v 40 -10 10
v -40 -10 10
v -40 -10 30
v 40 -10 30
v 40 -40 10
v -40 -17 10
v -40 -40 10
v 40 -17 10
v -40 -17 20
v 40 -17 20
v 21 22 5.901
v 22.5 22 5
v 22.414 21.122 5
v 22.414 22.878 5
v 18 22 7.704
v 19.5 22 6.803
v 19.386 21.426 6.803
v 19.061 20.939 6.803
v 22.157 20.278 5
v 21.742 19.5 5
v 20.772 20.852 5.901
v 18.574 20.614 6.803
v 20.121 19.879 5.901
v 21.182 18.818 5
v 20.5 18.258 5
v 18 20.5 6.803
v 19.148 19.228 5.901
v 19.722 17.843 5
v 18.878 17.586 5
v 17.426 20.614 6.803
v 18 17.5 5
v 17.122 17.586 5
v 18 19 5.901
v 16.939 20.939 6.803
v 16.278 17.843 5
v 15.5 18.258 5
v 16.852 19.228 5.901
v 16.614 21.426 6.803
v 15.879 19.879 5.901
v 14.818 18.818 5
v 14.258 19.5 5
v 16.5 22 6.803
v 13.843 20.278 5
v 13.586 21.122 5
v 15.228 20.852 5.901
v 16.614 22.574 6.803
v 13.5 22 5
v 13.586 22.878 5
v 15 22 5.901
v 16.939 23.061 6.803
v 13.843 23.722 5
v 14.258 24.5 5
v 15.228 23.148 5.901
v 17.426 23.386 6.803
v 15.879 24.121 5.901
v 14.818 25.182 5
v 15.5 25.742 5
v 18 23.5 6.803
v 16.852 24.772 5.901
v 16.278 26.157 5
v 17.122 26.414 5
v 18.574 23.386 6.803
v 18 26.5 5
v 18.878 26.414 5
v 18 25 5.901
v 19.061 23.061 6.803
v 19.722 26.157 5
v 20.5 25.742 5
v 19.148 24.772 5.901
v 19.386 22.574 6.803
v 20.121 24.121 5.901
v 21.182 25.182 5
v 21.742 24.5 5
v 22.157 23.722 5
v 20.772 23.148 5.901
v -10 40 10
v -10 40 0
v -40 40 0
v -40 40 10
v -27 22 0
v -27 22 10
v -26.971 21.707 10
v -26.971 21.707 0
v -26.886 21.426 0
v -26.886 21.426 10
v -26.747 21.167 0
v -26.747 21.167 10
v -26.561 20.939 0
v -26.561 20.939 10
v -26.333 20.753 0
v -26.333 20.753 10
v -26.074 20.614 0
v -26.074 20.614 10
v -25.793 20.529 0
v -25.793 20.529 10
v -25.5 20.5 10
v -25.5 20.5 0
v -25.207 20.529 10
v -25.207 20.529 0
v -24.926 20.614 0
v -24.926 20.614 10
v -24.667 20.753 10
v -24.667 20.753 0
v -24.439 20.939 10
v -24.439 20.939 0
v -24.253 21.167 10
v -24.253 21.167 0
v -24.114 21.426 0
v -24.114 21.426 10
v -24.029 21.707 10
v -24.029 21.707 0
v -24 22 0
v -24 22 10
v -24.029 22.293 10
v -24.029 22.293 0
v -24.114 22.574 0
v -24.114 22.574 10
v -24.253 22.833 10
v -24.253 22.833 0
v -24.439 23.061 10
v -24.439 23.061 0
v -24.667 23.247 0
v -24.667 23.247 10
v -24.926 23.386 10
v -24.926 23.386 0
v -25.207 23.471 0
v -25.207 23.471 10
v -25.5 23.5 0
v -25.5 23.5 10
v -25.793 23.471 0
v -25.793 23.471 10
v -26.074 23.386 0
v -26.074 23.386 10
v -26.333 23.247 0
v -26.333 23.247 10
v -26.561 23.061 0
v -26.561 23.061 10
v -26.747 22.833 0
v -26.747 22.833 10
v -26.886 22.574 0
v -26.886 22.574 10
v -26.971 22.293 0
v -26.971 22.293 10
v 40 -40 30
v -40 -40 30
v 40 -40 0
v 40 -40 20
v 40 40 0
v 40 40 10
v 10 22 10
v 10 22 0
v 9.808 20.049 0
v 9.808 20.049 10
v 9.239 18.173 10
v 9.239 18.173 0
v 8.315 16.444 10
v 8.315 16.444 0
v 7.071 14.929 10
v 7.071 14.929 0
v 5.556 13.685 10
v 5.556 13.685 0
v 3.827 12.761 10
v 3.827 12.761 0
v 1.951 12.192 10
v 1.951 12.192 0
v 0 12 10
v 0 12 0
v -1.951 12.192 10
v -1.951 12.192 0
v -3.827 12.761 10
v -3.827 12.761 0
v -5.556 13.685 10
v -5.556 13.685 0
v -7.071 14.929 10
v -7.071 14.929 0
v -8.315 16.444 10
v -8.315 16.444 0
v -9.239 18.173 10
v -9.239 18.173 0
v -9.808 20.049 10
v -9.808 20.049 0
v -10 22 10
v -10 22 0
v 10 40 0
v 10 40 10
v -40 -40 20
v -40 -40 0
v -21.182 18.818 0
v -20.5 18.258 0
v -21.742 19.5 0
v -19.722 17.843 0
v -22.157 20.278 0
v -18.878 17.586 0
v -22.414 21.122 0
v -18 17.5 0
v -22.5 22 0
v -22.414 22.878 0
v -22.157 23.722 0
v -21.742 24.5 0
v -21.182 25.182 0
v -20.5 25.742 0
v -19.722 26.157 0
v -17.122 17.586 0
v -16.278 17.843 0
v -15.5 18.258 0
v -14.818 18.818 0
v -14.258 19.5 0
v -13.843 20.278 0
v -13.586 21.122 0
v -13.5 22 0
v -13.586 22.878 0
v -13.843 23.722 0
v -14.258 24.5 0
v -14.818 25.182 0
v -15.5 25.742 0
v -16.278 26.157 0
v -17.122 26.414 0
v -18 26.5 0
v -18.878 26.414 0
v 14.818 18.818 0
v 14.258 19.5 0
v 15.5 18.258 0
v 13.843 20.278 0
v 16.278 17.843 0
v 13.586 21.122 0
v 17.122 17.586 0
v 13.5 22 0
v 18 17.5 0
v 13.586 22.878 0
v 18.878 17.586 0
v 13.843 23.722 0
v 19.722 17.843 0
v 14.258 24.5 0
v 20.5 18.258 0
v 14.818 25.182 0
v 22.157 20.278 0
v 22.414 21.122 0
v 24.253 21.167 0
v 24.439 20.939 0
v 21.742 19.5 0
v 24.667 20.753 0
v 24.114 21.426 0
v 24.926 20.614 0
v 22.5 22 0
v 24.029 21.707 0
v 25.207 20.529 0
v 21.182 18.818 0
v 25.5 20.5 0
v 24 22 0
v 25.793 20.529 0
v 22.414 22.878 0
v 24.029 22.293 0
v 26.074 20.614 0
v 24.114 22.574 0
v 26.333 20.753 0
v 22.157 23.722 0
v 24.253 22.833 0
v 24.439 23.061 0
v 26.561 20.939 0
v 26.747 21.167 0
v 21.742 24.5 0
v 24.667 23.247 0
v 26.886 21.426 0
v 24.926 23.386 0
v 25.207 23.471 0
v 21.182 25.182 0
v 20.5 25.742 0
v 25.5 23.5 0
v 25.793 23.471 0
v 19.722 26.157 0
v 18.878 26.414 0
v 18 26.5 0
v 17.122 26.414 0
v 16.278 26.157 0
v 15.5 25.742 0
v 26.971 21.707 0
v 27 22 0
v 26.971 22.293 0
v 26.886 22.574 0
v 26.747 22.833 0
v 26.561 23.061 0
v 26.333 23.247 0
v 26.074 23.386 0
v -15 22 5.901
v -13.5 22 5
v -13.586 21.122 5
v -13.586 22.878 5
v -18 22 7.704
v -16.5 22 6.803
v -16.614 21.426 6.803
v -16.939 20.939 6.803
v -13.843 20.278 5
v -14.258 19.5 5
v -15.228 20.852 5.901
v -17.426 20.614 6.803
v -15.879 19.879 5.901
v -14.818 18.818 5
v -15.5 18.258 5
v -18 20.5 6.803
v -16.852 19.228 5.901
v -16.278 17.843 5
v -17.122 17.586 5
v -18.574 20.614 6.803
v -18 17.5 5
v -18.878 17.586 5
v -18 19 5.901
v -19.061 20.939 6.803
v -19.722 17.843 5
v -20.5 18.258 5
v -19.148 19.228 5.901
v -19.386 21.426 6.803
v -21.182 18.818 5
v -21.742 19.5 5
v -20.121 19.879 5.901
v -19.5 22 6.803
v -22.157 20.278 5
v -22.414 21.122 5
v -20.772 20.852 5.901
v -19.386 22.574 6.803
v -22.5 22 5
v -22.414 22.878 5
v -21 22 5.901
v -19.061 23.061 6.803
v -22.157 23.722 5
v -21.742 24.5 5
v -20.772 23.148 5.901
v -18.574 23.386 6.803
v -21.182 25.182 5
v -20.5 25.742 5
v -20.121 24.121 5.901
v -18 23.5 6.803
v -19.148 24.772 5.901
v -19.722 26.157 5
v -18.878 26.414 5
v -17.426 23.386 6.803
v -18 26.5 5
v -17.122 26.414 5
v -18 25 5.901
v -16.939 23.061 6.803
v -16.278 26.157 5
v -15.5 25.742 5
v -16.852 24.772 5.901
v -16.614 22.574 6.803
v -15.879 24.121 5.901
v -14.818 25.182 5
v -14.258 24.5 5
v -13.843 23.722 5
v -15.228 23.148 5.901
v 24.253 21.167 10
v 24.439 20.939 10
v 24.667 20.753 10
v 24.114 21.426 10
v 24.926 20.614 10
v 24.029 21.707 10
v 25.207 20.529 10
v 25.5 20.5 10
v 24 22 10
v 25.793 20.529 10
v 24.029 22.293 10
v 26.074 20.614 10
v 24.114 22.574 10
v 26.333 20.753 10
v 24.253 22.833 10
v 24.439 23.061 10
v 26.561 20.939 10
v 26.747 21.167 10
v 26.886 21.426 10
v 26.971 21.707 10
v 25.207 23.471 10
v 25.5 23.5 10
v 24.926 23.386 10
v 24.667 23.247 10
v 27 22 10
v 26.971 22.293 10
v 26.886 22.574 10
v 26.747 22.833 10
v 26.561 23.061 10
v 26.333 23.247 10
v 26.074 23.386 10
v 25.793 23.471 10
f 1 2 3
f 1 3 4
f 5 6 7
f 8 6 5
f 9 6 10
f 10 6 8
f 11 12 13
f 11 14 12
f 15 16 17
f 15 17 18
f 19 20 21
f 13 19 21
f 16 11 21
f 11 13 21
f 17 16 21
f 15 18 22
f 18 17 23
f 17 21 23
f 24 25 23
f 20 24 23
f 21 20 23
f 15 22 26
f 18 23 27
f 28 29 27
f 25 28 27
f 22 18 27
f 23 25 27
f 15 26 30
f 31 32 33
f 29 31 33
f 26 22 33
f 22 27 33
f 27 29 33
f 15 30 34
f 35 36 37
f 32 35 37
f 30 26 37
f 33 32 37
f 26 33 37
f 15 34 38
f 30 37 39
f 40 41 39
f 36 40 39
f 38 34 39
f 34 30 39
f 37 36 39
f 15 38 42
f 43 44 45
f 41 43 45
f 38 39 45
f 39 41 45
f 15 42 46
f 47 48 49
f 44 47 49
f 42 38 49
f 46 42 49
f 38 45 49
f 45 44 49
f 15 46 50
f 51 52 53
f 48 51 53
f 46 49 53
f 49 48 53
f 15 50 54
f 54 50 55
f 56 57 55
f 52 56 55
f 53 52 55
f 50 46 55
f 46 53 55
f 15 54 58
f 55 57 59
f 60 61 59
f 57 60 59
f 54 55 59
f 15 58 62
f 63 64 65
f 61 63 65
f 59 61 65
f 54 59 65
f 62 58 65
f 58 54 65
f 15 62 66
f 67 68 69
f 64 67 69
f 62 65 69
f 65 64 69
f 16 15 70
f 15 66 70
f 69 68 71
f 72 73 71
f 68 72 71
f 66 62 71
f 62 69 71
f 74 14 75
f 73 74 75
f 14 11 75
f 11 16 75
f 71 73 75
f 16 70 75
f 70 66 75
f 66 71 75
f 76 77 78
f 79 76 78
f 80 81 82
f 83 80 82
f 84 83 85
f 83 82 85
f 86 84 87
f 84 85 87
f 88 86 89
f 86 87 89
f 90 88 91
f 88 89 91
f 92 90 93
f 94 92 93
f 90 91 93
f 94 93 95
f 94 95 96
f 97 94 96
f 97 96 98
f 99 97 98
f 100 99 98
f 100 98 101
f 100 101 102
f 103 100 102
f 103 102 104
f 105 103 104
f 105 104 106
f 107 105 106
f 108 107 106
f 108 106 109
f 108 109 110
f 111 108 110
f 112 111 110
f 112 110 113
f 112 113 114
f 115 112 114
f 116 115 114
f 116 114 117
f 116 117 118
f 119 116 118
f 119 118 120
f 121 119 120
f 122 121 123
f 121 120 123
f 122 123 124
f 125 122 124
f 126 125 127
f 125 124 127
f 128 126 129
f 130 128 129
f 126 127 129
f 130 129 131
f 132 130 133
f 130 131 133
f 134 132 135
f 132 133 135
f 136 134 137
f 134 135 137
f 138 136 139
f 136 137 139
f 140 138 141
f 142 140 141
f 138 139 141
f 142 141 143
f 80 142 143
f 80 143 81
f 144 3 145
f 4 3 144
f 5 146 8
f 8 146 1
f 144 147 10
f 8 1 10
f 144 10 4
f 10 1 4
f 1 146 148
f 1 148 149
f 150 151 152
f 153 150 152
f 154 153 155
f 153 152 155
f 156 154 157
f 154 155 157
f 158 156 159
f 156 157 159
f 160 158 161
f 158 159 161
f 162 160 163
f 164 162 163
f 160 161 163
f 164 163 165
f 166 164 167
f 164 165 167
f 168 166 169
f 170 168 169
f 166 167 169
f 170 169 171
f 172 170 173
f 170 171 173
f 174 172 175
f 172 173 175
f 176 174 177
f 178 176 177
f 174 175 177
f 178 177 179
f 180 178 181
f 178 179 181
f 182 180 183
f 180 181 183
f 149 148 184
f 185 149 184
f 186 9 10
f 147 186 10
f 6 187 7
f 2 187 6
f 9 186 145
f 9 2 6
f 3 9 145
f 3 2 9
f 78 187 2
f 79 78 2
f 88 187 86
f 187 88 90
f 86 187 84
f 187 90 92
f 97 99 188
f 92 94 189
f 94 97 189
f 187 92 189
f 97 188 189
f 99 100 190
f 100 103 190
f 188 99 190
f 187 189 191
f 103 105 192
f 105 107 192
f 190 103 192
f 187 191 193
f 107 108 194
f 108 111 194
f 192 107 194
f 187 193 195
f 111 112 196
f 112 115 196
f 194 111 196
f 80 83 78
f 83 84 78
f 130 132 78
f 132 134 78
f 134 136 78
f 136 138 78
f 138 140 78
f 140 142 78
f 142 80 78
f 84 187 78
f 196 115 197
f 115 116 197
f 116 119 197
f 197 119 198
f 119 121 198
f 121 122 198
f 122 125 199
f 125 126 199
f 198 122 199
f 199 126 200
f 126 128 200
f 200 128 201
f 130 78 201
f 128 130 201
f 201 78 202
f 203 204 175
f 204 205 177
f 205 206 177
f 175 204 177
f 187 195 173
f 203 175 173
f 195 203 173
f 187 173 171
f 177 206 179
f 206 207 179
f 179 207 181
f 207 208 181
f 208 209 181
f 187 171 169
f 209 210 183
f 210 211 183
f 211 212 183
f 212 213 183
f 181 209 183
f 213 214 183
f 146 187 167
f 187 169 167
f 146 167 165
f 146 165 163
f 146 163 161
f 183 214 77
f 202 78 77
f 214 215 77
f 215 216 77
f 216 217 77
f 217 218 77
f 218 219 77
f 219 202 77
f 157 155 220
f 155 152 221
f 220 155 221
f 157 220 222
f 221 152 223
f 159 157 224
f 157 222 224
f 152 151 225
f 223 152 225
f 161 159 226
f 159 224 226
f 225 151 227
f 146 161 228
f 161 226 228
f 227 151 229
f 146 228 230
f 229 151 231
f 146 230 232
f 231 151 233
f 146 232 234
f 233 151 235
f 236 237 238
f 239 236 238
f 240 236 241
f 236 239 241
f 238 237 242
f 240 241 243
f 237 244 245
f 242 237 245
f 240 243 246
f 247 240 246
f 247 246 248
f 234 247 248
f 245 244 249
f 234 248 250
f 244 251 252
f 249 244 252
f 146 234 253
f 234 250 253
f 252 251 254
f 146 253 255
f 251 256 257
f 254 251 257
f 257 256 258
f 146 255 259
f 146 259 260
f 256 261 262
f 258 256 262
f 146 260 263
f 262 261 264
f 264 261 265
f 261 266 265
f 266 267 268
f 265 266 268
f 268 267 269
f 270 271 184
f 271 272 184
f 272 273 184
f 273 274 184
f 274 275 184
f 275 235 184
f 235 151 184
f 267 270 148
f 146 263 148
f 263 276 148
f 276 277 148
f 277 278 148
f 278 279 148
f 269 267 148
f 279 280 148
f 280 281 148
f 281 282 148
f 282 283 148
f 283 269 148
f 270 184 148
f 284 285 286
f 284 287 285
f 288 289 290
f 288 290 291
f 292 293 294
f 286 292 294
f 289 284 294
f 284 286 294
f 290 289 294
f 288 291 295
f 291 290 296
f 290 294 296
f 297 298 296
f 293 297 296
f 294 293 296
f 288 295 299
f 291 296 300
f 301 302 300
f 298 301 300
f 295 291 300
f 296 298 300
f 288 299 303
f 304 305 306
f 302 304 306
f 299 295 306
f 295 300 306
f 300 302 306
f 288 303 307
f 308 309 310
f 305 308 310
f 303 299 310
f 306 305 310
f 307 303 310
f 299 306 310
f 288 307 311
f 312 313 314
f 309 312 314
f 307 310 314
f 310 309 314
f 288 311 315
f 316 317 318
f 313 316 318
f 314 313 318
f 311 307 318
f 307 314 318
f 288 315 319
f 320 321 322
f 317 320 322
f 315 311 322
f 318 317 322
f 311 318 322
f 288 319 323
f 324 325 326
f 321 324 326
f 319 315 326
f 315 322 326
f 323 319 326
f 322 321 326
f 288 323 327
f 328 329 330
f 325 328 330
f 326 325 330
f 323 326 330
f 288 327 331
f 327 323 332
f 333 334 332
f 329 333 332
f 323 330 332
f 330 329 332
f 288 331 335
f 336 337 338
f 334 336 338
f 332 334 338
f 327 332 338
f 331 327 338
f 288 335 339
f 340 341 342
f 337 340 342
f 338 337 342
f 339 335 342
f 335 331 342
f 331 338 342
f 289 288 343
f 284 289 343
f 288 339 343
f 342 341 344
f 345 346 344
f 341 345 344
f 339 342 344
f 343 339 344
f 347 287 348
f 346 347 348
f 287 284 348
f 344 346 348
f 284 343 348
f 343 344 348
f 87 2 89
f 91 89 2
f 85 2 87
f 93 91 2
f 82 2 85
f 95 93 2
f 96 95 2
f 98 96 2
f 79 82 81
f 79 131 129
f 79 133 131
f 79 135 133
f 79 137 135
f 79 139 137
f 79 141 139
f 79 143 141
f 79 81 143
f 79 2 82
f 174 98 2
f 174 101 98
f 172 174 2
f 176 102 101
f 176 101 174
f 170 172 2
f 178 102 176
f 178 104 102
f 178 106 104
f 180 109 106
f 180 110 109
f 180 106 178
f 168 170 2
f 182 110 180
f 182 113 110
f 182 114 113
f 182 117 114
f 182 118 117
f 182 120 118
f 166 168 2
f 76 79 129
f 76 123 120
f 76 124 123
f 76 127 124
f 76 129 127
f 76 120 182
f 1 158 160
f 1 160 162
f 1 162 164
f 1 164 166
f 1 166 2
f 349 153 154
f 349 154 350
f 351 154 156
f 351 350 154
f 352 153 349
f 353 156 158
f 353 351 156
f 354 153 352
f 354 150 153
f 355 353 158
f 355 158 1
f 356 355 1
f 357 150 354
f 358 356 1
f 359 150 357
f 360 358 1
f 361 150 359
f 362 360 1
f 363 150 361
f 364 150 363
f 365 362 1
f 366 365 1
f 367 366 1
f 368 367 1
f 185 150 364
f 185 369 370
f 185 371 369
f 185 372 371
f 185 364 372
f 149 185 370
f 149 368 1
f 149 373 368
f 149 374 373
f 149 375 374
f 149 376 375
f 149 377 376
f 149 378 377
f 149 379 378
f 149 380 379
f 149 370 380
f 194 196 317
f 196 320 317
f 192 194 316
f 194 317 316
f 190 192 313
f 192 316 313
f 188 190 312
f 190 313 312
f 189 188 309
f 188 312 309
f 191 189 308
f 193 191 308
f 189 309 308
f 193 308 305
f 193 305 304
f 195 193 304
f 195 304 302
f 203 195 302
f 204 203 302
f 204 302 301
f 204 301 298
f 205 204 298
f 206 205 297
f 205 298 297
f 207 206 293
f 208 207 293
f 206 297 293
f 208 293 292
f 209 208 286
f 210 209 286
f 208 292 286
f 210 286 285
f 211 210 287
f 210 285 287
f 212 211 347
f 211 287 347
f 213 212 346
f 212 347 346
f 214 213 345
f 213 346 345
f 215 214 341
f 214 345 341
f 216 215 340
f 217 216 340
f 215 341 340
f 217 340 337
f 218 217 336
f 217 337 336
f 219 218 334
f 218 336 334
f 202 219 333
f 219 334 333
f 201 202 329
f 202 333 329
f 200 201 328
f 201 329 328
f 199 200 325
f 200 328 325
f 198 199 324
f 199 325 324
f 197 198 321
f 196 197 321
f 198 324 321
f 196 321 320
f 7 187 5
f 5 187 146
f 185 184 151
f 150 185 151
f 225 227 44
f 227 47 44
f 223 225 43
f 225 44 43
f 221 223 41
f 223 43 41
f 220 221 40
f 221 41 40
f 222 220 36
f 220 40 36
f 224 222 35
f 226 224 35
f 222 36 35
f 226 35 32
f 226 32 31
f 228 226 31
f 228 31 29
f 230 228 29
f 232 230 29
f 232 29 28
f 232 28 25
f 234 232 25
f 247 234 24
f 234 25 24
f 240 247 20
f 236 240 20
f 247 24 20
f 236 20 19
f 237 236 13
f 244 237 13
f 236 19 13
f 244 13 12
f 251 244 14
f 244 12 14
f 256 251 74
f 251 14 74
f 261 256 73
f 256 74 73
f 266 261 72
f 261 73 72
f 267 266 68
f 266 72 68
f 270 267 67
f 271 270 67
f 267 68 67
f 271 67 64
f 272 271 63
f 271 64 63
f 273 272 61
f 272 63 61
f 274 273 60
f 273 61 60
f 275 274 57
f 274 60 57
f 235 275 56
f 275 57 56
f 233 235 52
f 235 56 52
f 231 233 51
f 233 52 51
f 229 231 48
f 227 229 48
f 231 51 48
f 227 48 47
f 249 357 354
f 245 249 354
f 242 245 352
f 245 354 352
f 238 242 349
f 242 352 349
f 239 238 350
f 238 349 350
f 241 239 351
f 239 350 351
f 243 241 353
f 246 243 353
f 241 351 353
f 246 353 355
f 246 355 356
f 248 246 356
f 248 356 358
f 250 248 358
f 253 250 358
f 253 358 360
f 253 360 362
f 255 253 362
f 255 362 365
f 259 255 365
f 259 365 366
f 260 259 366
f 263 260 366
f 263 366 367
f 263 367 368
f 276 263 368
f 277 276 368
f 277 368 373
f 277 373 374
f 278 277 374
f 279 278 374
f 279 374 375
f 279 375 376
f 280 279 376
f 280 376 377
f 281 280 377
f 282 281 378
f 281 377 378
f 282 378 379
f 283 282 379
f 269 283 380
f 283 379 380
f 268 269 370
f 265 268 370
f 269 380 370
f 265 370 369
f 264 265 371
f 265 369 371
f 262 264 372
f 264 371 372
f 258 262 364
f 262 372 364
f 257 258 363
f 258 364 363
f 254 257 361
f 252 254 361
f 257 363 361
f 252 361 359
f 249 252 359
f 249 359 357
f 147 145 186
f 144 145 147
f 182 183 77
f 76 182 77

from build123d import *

# Parameters (mm, degrees)
F1_DEPTH = 10
F2_W     = 80
F2_H     = 7
F3_DEPTH = 20
F4_W     = 80
F4_H     = 10
F5_DEPTH = 23
F6_D     = 3
F7_D     = 3
F8_D     = 9
F8_DEPTH = 5
F8_TIP   = 2.7038727856


with BuildPart() as f1:
    # F0 (on Top) → F1 (new body)
    with BuildSketch(Plane.XY):
        with BuildLine():
            Line((-40, -40), (40, -40))
            Line((40, -40), (40, 40))
            Line((40, 40), (10, 40))
            Line((10, 40), (10, 22))
            ThreePointArc((10, 22), (0, 12), (-10, 22))
            Line((-10, 22), (-10, 40))
            Line((-10, 40), (-40, 40))
            Line((-40, 40), (-40, -40))
        make_face()
    extrude(amount=F1_DEPTH)

    # F2 (on face) → F3 (join)
    with BuildSketch(Plane.XY.offset(10)):
        with Locations((0, -13.5)):
            Rectangle(F2_W, F2_H)
    extrude(amount=F3_DEPTH)

    # F4 (on face) → F5 (join)
    with BuildSketch(Plane.XZ.offset(17)):
        with Locations((0, 25)):
            Rectangle(F4_W, F4_H)
    extrude(amount=F5_DEPTH)

    # F6 (through all)
    with Locations(Plane(origin=(0, 0, 0), x_dir=(1, 0, 0), z_dir=(0, 0, -1))):
        with Locations((25.5, -22)):
            Hole(F6_D / 2)

    # F7 (through all)
    with Locations(Plane(origin=(0, 0, 0), x_dir=(1, 0, 0), z_dir=(0, 0, -1))):
        with Locations((-25.5, -22)):
            Hole(F7_D / 2)

    # F8
    with Locations(Plane(origin=(0, 0, 0), x_dir=(1, 0, 0), z_dir=(0, 0, -1))):
        with Locations((18, -22), (-18, -22)):
            Hole(F8_D / 2, depth=F8_DEPTH)
            with Locations((0, 0, -(F8_DEPTH + F8_TIP / 2))):  # 118° drill point
                Cone(0, F8_D / 2, F8_TIP, mode=Mode.SUBTRACT)


solid = f1.part
